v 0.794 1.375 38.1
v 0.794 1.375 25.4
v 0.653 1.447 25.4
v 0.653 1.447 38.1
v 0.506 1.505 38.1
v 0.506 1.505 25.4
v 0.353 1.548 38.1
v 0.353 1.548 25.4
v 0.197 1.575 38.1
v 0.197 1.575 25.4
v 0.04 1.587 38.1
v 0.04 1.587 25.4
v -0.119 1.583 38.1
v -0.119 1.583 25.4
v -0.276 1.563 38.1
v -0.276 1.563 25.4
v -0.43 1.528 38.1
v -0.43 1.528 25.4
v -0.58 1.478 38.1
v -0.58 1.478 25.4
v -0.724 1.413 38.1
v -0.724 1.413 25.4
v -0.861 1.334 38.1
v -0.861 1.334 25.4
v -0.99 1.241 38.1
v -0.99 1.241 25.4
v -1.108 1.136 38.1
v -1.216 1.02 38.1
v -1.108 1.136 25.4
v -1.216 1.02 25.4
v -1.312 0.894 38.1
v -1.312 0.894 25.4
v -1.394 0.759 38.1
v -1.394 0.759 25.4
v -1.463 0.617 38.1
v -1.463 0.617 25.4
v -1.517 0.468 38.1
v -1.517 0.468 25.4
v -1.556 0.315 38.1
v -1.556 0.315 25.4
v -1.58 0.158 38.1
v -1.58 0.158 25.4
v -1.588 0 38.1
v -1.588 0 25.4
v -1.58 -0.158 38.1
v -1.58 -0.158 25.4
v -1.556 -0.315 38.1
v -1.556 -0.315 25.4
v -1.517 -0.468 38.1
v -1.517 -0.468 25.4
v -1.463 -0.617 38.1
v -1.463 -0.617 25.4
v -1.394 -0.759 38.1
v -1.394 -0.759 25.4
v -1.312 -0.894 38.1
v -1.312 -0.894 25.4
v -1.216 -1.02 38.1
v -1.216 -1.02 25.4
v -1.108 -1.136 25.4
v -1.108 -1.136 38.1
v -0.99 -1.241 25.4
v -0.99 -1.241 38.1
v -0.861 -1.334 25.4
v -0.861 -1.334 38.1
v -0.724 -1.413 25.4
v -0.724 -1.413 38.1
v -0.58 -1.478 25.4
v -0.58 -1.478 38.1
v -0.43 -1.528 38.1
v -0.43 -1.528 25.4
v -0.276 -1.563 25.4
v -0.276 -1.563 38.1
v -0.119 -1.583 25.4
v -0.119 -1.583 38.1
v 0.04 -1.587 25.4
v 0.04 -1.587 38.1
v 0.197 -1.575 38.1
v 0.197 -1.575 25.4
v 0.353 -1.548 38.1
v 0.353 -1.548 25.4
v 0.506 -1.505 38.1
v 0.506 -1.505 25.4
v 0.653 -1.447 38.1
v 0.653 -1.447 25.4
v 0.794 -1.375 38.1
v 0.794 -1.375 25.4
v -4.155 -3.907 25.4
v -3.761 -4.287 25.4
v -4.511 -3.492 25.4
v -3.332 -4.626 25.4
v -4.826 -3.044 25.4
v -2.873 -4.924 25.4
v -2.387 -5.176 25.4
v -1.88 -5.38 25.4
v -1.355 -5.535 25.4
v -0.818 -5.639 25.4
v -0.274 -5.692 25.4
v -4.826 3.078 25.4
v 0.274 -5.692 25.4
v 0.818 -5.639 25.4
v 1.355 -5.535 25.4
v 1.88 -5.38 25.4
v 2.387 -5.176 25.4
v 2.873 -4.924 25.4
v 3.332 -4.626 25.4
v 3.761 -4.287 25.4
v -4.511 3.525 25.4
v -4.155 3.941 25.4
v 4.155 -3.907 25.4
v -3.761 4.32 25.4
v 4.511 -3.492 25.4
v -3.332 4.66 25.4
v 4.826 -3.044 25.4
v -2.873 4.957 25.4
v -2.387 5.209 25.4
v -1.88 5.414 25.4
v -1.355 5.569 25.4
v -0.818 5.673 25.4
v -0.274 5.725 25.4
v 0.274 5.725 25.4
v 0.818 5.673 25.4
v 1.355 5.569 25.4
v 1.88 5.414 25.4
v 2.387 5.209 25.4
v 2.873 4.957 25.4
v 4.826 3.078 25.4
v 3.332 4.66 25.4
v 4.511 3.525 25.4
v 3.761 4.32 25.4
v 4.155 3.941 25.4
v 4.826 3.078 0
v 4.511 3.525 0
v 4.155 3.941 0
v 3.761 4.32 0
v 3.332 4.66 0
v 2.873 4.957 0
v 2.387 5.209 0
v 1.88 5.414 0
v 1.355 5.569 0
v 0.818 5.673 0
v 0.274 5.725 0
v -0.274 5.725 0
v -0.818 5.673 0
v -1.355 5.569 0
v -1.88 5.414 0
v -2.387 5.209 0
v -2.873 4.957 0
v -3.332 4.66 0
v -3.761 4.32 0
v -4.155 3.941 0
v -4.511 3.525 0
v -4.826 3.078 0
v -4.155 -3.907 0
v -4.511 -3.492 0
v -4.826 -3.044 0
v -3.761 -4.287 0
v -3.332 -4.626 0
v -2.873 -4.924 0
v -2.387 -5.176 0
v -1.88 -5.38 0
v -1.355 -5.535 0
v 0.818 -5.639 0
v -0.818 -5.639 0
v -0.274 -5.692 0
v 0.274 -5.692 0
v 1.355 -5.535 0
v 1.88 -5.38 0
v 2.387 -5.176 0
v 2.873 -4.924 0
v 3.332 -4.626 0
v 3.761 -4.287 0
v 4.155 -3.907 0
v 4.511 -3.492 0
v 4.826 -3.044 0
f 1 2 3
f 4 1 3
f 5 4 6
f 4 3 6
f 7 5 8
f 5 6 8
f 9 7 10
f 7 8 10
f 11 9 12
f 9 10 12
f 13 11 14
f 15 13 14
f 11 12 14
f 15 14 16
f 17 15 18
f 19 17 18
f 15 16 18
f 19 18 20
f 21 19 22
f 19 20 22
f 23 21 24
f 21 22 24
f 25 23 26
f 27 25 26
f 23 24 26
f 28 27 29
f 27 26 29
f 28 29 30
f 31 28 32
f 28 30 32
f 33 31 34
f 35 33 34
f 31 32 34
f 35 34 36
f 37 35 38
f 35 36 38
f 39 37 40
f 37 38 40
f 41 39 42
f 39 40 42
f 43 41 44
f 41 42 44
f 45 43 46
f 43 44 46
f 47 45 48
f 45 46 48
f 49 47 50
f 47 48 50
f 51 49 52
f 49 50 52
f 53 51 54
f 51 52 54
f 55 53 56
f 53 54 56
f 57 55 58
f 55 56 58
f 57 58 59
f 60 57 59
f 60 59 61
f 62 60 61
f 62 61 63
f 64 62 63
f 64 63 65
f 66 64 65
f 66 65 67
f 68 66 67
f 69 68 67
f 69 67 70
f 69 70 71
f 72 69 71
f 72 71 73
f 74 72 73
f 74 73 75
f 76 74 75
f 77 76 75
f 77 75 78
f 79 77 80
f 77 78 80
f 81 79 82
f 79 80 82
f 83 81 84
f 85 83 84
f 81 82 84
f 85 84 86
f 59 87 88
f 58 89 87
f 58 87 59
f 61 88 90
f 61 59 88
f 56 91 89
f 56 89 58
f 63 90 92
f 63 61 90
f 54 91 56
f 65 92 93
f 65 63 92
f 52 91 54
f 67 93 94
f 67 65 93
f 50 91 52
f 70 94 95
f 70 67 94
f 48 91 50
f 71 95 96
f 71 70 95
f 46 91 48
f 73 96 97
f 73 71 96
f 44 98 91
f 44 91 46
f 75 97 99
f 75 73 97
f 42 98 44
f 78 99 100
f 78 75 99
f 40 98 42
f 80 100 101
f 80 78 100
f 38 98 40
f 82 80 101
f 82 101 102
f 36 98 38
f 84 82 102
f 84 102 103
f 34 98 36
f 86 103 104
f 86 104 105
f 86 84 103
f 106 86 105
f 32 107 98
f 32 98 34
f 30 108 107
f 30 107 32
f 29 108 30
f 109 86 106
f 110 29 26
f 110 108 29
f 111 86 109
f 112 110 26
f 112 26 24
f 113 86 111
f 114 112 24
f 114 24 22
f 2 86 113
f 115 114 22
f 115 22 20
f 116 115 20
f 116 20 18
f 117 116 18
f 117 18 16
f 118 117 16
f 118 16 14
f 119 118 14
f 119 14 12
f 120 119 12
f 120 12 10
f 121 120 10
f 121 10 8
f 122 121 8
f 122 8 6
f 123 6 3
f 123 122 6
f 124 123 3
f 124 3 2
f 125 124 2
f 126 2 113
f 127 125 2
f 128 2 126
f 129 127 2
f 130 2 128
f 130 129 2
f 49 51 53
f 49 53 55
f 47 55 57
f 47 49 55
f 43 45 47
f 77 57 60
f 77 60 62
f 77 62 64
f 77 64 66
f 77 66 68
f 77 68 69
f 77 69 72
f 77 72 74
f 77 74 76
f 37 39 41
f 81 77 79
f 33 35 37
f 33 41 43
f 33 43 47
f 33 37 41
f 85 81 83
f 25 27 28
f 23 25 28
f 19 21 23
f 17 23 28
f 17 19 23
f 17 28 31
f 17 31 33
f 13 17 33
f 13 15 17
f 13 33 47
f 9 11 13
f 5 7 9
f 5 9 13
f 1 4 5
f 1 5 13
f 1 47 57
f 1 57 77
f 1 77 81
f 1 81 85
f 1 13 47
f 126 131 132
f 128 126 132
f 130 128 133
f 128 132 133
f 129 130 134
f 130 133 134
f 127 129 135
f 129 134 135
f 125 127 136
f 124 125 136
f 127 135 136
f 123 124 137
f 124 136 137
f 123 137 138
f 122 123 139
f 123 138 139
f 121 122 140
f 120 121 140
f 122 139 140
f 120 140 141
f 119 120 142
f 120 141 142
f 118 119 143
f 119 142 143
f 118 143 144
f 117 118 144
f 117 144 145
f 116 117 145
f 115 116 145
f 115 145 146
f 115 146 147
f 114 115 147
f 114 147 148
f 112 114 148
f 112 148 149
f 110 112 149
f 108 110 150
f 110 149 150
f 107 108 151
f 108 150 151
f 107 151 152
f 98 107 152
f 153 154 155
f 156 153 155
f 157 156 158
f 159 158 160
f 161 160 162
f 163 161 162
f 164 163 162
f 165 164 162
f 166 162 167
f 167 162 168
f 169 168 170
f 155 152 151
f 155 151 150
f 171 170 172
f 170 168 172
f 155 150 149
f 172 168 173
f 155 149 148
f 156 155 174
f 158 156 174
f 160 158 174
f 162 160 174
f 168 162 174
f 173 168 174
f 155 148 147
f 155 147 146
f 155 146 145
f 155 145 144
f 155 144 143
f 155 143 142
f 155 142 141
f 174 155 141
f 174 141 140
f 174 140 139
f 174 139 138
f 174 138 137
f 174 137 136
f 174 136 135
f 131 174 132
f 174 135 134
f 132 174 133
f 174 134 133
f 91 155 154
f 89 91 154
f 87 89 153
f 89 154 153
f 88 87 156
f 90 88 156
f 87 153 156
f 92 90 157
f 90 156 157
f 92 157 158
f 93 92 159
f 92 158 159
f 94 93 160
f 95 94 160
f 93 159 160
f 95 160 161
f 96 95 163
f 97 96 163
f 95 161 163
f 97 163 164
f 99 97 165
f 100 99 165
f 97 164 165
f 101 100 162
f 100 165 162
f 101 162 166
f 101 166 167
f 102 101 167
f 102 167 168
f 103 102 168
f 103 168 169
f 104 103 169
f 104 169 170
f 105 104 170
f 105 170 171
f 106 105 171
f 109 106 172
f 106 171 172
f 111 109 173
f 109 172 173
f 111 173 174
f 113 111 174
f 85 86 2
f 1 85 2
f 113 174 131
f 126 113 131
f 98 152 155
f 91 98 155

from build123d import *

# Parameters (mm, degrees)
BOSS_EXTRUDE1_DEPTH = 25.4
BOSS_EXTRUDE2_DEPTH = 12.7


with BuildPart() as part:
    # Sketch1 → Boss-Extrude1 (new body)
    with BuildSketch(Plane.XY):
        with BuildLine():
            Line((-4.826, 0.016704998), (-4.826, -3.044495583))
            ThreePointArc((-4.826, -3.044495583), (0, -5.698295002), (4.826, -3.044495583))
            Line((4.826, -3.044495583), (4.826, 0.016704998))
            Line((4.826, 0.016704998), (4.826, 3.07790558))
            ThreePointArc((4.826, 3.07790558), (0, 5.731704998), (-4.826, 3.07790558))
            Line((-4.826, 3.07790558), (-4.826, 0.016704998))
        make_face()
    extrude(amount=BOSS_EXTRUDE1_DEPTH)

    # Sketch2 → Boss-Extrude2 (add)
    with BuildSketch(Plane.XY.offset(25.4)):
        with BuildLine():
            Line((0.79375, 0), (0.79375, 1.374815329))
            ThreePointArc((0.79375, 1.374815329), (-1.5875, 0), (0.79375, -1.374815329))
            Line((0.79375, -1.374815329), (0.79375, 0))
        make_face()
    extrude(amount=BOSS_EXTRUDE2_DEPTH)


solid = part.part
